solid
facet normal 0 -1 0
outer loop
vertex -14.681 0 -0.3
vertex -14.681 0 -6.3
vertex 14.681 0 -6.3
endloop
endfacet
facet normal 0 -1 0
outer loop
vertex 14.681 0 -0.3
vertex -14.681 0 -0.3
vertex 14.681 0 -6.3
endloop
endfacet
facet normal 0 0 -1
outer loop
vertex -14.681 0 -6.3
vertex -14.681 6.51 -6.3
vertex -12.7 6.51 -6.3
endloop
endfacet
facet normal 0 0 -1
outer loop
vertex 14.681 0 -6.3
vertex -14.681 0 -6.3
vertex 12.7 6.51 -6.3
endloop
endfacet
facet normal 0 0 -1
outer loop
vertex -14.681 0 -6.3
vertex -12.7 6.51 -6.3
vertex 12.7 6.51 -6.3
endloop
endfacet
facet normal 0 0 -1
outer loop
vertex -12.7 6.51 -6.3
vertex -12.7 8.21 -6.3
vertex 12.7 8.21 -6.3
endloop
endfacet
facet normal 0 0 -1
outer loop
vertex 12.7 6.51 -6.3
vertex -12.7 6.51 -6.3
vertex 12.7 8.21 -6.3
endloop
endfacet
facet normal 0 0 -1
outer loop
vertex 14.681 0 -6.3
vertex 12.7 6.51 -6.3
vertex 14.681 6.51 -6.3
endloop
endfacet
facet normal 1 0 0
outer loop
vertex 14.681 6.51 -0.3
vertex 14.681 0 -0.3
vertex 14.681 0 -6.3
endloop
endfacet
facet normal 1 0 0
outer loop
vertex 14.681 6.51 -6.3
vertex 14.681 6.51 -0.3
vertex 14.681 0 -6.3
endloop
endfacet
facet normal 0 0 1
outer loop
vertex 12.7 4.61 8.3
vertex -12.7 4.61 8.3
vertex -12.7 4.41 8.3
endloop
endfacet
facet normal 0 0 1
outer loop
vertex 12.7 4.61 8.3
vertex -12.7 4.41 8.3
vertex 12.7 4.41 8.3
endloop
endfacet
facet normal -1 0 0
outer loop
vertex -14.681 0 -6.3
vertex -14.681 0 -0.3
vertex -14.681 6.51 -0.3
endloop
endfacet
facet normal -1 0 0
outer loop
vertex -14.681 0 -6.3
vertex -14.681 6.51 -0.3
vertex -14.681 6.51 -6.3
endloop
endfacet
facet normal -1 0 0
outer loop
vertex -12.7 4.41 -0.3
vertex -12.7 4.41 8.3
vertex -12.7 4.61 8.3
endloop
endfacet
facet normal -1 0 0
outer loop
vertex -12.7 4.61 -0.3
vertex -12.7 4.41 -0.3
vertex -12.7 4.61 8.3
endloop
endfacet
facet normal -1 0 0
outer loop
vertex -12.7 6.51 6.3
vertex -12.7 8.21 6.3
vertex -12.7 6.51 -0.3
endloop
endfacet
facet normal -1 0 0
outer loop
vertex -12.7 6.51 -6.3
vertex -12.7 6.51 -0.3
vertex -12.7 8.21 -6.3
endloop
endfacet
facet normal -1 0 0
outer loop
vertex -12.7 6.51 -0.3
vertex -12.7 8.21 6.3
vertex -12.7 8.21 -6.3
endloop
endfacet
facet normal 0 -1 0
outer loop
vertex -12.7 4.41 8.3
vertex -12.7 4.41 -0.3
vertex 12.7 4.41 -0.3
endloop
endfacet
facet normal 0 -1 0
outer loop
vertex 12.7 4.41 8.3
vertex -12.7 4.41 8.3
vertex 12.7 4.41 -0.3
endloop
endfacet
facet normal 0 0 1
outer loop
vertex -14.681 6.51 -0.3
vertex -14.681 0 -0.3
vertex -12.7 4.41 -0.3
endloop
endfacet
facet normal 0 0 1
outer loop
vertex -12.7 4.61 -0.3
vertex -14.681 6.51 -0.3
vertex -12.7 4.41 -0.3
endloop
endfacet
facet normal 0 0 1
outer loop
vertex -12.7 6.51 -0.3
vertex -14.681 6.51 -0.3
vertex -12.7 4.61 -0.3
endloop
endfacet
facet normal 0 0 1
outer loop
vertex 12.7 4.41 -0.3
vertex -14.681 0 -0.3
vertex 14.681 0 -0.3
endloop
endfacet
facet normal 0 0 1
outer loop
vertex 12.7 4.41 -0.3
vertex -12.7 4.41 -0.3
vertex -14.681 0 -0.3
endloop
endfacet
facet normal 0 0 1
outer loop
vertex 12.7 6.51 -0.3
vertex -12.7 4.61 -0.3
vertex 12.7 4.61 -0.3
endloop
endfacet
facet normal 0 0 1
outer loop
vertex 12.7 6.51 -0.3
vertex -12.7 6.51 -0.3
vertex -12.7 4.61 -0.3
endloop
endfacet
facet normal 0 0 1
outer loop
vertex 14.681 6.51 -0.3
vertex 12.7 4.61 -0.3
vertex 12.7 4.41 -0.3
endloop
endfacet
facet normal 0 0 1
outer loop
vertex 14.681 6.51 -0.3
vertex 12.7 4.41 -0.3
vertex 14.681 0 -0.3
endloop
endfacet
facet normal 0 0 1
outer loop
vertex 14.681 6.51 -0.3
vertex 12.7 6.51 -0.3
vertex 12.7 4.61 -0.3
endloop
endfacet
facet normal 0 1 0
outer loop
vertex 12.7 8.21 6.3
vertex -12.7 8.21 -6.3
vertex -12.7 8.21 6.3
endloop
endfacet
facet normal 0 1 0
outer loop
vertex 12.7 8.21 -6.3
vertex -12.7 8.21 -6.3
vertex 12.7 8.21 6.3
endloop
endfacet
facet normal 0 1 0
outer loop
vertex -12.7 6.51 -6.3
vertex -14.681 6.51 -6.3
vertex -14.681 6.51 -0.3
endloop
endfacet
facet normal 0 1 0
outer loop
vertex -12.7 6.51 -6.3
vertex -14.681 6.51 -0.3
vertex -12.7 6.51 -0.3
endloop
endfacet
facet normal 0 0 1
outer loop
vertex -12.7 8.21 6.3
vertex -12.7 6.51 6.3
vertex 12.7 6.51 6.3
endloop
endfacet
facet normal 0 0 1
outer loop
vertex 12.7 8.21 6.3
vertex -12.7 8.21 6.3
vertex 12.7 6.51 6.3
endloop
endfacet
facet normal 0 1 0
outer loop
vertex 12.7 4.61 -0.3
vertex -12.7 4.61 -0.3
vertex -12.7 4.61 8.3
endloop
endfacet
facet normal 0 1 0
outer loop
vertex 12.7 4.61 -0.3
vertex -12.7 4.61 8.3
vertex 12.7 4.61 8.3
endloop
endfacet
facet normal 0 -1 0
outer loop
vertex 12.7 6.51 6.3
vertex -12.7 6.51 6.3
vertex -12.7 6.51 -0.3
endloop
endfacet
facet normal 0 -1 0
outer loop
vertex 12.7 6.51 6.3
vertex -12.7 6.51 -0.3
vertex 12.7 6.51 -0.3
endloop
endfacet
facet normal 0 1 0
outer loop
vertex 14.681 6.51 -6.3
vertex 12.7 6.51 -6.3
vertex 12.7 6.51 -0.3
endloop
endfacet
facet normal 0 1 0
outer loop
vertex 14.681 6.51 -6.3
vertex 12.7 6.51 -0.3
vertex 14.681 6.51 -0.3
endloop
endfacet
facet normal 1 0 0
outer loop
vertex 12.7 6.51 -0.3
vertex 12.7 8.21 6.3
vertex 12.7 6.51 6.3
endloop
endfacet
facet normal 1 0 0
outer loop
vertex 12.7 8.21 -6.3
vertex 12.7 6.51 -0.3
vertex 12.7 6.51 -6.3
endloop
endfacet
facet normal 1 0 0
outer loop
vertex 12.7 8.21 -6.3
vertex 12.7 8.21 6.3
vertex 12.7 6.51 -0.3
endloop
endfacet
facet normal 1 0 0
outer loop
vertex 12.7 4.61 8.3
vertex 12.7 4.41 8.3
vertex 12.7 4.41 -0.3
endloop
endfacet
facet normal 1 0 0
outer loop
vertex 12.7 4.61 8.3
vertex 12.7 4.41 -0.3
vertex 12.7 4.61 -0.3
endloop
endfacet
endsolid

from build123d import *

# Parameters (mm, degrees)
SKETCH1_W           = 29.3624
SKETCH1_H           = 12.6
BOSS_EXTRUDE1_DEPTH = 8.21
SKETCH4_W           = 29.3624
SKETCH4_H           = 6.51
CUT_EXTRUDE2_DEPTH  = 6.6
BOSS_EXTRUDE2_START = -12.6
SKETCH2_W           = 25.4
SKETCH2_H           = 0.2
BOSS_EXTRUDE2_DEPTH = 14.6
SKETCH3_W           = 1.9812
SKETCH3_H           = 12.6
CUT_EXTRUDE1_DEPTH  = 1.7


with BuildPart() as part:
    # Sketch1 → Boss-Extrude1 (new body)
    with BuildSketch(Plane(origin=(0, 0, 0), x_dir=(1, 0, 0), z_dir=(0, 1, 0))):
        Rectangle(SKETCH1_W, SKETCH1_H)
    extrude(amount=BOSS_EXTRUDE1_DEPTH)

    # Sketch4 → Cut-Extrude2 (cut)
    with BuildSketch(Plane.XY.offset(6.3)):
        with Locations((0, 3.255)):
            Rectangle(SKETCH4_W, SKETCH4_H)
    extrude(amount=-CUT_EXTRUDE2_DEPTH, mode=Mode.SUBTRACT)

    # Sketch2 → Boss-Extrude2 (add)
    with BuildSketch(Plane.XY.offset(6.3).offset(BOSS_EXTRUDE2_START)):
        with Locations((0, 4.51)):
            Rectangle(SKETCH2_W, SKETCH2_H)
    extrude(amount=BOSS_EXTRUDE2_DEPTH)

    # Sketch3 → Cut-Extrude1 (cut)
    with BuildSketch(Plane(origin=(0, 8.21, 0), x_dir=(1, 0, 0), z_dir=(0, 1, 0))):
        with Locations((-13.6906, 0)):
            Rectangle(SKETCH3_W, SKETCH3_H)
        with Locations((13.6906, 0)):
            Rectangle(SKETCH3_W, SKETCH3_H)
    extrude(amount=-CUT_EXTRUDE1_DEPTH, mode=Mode.SUBTRACT)


solid = part.part
